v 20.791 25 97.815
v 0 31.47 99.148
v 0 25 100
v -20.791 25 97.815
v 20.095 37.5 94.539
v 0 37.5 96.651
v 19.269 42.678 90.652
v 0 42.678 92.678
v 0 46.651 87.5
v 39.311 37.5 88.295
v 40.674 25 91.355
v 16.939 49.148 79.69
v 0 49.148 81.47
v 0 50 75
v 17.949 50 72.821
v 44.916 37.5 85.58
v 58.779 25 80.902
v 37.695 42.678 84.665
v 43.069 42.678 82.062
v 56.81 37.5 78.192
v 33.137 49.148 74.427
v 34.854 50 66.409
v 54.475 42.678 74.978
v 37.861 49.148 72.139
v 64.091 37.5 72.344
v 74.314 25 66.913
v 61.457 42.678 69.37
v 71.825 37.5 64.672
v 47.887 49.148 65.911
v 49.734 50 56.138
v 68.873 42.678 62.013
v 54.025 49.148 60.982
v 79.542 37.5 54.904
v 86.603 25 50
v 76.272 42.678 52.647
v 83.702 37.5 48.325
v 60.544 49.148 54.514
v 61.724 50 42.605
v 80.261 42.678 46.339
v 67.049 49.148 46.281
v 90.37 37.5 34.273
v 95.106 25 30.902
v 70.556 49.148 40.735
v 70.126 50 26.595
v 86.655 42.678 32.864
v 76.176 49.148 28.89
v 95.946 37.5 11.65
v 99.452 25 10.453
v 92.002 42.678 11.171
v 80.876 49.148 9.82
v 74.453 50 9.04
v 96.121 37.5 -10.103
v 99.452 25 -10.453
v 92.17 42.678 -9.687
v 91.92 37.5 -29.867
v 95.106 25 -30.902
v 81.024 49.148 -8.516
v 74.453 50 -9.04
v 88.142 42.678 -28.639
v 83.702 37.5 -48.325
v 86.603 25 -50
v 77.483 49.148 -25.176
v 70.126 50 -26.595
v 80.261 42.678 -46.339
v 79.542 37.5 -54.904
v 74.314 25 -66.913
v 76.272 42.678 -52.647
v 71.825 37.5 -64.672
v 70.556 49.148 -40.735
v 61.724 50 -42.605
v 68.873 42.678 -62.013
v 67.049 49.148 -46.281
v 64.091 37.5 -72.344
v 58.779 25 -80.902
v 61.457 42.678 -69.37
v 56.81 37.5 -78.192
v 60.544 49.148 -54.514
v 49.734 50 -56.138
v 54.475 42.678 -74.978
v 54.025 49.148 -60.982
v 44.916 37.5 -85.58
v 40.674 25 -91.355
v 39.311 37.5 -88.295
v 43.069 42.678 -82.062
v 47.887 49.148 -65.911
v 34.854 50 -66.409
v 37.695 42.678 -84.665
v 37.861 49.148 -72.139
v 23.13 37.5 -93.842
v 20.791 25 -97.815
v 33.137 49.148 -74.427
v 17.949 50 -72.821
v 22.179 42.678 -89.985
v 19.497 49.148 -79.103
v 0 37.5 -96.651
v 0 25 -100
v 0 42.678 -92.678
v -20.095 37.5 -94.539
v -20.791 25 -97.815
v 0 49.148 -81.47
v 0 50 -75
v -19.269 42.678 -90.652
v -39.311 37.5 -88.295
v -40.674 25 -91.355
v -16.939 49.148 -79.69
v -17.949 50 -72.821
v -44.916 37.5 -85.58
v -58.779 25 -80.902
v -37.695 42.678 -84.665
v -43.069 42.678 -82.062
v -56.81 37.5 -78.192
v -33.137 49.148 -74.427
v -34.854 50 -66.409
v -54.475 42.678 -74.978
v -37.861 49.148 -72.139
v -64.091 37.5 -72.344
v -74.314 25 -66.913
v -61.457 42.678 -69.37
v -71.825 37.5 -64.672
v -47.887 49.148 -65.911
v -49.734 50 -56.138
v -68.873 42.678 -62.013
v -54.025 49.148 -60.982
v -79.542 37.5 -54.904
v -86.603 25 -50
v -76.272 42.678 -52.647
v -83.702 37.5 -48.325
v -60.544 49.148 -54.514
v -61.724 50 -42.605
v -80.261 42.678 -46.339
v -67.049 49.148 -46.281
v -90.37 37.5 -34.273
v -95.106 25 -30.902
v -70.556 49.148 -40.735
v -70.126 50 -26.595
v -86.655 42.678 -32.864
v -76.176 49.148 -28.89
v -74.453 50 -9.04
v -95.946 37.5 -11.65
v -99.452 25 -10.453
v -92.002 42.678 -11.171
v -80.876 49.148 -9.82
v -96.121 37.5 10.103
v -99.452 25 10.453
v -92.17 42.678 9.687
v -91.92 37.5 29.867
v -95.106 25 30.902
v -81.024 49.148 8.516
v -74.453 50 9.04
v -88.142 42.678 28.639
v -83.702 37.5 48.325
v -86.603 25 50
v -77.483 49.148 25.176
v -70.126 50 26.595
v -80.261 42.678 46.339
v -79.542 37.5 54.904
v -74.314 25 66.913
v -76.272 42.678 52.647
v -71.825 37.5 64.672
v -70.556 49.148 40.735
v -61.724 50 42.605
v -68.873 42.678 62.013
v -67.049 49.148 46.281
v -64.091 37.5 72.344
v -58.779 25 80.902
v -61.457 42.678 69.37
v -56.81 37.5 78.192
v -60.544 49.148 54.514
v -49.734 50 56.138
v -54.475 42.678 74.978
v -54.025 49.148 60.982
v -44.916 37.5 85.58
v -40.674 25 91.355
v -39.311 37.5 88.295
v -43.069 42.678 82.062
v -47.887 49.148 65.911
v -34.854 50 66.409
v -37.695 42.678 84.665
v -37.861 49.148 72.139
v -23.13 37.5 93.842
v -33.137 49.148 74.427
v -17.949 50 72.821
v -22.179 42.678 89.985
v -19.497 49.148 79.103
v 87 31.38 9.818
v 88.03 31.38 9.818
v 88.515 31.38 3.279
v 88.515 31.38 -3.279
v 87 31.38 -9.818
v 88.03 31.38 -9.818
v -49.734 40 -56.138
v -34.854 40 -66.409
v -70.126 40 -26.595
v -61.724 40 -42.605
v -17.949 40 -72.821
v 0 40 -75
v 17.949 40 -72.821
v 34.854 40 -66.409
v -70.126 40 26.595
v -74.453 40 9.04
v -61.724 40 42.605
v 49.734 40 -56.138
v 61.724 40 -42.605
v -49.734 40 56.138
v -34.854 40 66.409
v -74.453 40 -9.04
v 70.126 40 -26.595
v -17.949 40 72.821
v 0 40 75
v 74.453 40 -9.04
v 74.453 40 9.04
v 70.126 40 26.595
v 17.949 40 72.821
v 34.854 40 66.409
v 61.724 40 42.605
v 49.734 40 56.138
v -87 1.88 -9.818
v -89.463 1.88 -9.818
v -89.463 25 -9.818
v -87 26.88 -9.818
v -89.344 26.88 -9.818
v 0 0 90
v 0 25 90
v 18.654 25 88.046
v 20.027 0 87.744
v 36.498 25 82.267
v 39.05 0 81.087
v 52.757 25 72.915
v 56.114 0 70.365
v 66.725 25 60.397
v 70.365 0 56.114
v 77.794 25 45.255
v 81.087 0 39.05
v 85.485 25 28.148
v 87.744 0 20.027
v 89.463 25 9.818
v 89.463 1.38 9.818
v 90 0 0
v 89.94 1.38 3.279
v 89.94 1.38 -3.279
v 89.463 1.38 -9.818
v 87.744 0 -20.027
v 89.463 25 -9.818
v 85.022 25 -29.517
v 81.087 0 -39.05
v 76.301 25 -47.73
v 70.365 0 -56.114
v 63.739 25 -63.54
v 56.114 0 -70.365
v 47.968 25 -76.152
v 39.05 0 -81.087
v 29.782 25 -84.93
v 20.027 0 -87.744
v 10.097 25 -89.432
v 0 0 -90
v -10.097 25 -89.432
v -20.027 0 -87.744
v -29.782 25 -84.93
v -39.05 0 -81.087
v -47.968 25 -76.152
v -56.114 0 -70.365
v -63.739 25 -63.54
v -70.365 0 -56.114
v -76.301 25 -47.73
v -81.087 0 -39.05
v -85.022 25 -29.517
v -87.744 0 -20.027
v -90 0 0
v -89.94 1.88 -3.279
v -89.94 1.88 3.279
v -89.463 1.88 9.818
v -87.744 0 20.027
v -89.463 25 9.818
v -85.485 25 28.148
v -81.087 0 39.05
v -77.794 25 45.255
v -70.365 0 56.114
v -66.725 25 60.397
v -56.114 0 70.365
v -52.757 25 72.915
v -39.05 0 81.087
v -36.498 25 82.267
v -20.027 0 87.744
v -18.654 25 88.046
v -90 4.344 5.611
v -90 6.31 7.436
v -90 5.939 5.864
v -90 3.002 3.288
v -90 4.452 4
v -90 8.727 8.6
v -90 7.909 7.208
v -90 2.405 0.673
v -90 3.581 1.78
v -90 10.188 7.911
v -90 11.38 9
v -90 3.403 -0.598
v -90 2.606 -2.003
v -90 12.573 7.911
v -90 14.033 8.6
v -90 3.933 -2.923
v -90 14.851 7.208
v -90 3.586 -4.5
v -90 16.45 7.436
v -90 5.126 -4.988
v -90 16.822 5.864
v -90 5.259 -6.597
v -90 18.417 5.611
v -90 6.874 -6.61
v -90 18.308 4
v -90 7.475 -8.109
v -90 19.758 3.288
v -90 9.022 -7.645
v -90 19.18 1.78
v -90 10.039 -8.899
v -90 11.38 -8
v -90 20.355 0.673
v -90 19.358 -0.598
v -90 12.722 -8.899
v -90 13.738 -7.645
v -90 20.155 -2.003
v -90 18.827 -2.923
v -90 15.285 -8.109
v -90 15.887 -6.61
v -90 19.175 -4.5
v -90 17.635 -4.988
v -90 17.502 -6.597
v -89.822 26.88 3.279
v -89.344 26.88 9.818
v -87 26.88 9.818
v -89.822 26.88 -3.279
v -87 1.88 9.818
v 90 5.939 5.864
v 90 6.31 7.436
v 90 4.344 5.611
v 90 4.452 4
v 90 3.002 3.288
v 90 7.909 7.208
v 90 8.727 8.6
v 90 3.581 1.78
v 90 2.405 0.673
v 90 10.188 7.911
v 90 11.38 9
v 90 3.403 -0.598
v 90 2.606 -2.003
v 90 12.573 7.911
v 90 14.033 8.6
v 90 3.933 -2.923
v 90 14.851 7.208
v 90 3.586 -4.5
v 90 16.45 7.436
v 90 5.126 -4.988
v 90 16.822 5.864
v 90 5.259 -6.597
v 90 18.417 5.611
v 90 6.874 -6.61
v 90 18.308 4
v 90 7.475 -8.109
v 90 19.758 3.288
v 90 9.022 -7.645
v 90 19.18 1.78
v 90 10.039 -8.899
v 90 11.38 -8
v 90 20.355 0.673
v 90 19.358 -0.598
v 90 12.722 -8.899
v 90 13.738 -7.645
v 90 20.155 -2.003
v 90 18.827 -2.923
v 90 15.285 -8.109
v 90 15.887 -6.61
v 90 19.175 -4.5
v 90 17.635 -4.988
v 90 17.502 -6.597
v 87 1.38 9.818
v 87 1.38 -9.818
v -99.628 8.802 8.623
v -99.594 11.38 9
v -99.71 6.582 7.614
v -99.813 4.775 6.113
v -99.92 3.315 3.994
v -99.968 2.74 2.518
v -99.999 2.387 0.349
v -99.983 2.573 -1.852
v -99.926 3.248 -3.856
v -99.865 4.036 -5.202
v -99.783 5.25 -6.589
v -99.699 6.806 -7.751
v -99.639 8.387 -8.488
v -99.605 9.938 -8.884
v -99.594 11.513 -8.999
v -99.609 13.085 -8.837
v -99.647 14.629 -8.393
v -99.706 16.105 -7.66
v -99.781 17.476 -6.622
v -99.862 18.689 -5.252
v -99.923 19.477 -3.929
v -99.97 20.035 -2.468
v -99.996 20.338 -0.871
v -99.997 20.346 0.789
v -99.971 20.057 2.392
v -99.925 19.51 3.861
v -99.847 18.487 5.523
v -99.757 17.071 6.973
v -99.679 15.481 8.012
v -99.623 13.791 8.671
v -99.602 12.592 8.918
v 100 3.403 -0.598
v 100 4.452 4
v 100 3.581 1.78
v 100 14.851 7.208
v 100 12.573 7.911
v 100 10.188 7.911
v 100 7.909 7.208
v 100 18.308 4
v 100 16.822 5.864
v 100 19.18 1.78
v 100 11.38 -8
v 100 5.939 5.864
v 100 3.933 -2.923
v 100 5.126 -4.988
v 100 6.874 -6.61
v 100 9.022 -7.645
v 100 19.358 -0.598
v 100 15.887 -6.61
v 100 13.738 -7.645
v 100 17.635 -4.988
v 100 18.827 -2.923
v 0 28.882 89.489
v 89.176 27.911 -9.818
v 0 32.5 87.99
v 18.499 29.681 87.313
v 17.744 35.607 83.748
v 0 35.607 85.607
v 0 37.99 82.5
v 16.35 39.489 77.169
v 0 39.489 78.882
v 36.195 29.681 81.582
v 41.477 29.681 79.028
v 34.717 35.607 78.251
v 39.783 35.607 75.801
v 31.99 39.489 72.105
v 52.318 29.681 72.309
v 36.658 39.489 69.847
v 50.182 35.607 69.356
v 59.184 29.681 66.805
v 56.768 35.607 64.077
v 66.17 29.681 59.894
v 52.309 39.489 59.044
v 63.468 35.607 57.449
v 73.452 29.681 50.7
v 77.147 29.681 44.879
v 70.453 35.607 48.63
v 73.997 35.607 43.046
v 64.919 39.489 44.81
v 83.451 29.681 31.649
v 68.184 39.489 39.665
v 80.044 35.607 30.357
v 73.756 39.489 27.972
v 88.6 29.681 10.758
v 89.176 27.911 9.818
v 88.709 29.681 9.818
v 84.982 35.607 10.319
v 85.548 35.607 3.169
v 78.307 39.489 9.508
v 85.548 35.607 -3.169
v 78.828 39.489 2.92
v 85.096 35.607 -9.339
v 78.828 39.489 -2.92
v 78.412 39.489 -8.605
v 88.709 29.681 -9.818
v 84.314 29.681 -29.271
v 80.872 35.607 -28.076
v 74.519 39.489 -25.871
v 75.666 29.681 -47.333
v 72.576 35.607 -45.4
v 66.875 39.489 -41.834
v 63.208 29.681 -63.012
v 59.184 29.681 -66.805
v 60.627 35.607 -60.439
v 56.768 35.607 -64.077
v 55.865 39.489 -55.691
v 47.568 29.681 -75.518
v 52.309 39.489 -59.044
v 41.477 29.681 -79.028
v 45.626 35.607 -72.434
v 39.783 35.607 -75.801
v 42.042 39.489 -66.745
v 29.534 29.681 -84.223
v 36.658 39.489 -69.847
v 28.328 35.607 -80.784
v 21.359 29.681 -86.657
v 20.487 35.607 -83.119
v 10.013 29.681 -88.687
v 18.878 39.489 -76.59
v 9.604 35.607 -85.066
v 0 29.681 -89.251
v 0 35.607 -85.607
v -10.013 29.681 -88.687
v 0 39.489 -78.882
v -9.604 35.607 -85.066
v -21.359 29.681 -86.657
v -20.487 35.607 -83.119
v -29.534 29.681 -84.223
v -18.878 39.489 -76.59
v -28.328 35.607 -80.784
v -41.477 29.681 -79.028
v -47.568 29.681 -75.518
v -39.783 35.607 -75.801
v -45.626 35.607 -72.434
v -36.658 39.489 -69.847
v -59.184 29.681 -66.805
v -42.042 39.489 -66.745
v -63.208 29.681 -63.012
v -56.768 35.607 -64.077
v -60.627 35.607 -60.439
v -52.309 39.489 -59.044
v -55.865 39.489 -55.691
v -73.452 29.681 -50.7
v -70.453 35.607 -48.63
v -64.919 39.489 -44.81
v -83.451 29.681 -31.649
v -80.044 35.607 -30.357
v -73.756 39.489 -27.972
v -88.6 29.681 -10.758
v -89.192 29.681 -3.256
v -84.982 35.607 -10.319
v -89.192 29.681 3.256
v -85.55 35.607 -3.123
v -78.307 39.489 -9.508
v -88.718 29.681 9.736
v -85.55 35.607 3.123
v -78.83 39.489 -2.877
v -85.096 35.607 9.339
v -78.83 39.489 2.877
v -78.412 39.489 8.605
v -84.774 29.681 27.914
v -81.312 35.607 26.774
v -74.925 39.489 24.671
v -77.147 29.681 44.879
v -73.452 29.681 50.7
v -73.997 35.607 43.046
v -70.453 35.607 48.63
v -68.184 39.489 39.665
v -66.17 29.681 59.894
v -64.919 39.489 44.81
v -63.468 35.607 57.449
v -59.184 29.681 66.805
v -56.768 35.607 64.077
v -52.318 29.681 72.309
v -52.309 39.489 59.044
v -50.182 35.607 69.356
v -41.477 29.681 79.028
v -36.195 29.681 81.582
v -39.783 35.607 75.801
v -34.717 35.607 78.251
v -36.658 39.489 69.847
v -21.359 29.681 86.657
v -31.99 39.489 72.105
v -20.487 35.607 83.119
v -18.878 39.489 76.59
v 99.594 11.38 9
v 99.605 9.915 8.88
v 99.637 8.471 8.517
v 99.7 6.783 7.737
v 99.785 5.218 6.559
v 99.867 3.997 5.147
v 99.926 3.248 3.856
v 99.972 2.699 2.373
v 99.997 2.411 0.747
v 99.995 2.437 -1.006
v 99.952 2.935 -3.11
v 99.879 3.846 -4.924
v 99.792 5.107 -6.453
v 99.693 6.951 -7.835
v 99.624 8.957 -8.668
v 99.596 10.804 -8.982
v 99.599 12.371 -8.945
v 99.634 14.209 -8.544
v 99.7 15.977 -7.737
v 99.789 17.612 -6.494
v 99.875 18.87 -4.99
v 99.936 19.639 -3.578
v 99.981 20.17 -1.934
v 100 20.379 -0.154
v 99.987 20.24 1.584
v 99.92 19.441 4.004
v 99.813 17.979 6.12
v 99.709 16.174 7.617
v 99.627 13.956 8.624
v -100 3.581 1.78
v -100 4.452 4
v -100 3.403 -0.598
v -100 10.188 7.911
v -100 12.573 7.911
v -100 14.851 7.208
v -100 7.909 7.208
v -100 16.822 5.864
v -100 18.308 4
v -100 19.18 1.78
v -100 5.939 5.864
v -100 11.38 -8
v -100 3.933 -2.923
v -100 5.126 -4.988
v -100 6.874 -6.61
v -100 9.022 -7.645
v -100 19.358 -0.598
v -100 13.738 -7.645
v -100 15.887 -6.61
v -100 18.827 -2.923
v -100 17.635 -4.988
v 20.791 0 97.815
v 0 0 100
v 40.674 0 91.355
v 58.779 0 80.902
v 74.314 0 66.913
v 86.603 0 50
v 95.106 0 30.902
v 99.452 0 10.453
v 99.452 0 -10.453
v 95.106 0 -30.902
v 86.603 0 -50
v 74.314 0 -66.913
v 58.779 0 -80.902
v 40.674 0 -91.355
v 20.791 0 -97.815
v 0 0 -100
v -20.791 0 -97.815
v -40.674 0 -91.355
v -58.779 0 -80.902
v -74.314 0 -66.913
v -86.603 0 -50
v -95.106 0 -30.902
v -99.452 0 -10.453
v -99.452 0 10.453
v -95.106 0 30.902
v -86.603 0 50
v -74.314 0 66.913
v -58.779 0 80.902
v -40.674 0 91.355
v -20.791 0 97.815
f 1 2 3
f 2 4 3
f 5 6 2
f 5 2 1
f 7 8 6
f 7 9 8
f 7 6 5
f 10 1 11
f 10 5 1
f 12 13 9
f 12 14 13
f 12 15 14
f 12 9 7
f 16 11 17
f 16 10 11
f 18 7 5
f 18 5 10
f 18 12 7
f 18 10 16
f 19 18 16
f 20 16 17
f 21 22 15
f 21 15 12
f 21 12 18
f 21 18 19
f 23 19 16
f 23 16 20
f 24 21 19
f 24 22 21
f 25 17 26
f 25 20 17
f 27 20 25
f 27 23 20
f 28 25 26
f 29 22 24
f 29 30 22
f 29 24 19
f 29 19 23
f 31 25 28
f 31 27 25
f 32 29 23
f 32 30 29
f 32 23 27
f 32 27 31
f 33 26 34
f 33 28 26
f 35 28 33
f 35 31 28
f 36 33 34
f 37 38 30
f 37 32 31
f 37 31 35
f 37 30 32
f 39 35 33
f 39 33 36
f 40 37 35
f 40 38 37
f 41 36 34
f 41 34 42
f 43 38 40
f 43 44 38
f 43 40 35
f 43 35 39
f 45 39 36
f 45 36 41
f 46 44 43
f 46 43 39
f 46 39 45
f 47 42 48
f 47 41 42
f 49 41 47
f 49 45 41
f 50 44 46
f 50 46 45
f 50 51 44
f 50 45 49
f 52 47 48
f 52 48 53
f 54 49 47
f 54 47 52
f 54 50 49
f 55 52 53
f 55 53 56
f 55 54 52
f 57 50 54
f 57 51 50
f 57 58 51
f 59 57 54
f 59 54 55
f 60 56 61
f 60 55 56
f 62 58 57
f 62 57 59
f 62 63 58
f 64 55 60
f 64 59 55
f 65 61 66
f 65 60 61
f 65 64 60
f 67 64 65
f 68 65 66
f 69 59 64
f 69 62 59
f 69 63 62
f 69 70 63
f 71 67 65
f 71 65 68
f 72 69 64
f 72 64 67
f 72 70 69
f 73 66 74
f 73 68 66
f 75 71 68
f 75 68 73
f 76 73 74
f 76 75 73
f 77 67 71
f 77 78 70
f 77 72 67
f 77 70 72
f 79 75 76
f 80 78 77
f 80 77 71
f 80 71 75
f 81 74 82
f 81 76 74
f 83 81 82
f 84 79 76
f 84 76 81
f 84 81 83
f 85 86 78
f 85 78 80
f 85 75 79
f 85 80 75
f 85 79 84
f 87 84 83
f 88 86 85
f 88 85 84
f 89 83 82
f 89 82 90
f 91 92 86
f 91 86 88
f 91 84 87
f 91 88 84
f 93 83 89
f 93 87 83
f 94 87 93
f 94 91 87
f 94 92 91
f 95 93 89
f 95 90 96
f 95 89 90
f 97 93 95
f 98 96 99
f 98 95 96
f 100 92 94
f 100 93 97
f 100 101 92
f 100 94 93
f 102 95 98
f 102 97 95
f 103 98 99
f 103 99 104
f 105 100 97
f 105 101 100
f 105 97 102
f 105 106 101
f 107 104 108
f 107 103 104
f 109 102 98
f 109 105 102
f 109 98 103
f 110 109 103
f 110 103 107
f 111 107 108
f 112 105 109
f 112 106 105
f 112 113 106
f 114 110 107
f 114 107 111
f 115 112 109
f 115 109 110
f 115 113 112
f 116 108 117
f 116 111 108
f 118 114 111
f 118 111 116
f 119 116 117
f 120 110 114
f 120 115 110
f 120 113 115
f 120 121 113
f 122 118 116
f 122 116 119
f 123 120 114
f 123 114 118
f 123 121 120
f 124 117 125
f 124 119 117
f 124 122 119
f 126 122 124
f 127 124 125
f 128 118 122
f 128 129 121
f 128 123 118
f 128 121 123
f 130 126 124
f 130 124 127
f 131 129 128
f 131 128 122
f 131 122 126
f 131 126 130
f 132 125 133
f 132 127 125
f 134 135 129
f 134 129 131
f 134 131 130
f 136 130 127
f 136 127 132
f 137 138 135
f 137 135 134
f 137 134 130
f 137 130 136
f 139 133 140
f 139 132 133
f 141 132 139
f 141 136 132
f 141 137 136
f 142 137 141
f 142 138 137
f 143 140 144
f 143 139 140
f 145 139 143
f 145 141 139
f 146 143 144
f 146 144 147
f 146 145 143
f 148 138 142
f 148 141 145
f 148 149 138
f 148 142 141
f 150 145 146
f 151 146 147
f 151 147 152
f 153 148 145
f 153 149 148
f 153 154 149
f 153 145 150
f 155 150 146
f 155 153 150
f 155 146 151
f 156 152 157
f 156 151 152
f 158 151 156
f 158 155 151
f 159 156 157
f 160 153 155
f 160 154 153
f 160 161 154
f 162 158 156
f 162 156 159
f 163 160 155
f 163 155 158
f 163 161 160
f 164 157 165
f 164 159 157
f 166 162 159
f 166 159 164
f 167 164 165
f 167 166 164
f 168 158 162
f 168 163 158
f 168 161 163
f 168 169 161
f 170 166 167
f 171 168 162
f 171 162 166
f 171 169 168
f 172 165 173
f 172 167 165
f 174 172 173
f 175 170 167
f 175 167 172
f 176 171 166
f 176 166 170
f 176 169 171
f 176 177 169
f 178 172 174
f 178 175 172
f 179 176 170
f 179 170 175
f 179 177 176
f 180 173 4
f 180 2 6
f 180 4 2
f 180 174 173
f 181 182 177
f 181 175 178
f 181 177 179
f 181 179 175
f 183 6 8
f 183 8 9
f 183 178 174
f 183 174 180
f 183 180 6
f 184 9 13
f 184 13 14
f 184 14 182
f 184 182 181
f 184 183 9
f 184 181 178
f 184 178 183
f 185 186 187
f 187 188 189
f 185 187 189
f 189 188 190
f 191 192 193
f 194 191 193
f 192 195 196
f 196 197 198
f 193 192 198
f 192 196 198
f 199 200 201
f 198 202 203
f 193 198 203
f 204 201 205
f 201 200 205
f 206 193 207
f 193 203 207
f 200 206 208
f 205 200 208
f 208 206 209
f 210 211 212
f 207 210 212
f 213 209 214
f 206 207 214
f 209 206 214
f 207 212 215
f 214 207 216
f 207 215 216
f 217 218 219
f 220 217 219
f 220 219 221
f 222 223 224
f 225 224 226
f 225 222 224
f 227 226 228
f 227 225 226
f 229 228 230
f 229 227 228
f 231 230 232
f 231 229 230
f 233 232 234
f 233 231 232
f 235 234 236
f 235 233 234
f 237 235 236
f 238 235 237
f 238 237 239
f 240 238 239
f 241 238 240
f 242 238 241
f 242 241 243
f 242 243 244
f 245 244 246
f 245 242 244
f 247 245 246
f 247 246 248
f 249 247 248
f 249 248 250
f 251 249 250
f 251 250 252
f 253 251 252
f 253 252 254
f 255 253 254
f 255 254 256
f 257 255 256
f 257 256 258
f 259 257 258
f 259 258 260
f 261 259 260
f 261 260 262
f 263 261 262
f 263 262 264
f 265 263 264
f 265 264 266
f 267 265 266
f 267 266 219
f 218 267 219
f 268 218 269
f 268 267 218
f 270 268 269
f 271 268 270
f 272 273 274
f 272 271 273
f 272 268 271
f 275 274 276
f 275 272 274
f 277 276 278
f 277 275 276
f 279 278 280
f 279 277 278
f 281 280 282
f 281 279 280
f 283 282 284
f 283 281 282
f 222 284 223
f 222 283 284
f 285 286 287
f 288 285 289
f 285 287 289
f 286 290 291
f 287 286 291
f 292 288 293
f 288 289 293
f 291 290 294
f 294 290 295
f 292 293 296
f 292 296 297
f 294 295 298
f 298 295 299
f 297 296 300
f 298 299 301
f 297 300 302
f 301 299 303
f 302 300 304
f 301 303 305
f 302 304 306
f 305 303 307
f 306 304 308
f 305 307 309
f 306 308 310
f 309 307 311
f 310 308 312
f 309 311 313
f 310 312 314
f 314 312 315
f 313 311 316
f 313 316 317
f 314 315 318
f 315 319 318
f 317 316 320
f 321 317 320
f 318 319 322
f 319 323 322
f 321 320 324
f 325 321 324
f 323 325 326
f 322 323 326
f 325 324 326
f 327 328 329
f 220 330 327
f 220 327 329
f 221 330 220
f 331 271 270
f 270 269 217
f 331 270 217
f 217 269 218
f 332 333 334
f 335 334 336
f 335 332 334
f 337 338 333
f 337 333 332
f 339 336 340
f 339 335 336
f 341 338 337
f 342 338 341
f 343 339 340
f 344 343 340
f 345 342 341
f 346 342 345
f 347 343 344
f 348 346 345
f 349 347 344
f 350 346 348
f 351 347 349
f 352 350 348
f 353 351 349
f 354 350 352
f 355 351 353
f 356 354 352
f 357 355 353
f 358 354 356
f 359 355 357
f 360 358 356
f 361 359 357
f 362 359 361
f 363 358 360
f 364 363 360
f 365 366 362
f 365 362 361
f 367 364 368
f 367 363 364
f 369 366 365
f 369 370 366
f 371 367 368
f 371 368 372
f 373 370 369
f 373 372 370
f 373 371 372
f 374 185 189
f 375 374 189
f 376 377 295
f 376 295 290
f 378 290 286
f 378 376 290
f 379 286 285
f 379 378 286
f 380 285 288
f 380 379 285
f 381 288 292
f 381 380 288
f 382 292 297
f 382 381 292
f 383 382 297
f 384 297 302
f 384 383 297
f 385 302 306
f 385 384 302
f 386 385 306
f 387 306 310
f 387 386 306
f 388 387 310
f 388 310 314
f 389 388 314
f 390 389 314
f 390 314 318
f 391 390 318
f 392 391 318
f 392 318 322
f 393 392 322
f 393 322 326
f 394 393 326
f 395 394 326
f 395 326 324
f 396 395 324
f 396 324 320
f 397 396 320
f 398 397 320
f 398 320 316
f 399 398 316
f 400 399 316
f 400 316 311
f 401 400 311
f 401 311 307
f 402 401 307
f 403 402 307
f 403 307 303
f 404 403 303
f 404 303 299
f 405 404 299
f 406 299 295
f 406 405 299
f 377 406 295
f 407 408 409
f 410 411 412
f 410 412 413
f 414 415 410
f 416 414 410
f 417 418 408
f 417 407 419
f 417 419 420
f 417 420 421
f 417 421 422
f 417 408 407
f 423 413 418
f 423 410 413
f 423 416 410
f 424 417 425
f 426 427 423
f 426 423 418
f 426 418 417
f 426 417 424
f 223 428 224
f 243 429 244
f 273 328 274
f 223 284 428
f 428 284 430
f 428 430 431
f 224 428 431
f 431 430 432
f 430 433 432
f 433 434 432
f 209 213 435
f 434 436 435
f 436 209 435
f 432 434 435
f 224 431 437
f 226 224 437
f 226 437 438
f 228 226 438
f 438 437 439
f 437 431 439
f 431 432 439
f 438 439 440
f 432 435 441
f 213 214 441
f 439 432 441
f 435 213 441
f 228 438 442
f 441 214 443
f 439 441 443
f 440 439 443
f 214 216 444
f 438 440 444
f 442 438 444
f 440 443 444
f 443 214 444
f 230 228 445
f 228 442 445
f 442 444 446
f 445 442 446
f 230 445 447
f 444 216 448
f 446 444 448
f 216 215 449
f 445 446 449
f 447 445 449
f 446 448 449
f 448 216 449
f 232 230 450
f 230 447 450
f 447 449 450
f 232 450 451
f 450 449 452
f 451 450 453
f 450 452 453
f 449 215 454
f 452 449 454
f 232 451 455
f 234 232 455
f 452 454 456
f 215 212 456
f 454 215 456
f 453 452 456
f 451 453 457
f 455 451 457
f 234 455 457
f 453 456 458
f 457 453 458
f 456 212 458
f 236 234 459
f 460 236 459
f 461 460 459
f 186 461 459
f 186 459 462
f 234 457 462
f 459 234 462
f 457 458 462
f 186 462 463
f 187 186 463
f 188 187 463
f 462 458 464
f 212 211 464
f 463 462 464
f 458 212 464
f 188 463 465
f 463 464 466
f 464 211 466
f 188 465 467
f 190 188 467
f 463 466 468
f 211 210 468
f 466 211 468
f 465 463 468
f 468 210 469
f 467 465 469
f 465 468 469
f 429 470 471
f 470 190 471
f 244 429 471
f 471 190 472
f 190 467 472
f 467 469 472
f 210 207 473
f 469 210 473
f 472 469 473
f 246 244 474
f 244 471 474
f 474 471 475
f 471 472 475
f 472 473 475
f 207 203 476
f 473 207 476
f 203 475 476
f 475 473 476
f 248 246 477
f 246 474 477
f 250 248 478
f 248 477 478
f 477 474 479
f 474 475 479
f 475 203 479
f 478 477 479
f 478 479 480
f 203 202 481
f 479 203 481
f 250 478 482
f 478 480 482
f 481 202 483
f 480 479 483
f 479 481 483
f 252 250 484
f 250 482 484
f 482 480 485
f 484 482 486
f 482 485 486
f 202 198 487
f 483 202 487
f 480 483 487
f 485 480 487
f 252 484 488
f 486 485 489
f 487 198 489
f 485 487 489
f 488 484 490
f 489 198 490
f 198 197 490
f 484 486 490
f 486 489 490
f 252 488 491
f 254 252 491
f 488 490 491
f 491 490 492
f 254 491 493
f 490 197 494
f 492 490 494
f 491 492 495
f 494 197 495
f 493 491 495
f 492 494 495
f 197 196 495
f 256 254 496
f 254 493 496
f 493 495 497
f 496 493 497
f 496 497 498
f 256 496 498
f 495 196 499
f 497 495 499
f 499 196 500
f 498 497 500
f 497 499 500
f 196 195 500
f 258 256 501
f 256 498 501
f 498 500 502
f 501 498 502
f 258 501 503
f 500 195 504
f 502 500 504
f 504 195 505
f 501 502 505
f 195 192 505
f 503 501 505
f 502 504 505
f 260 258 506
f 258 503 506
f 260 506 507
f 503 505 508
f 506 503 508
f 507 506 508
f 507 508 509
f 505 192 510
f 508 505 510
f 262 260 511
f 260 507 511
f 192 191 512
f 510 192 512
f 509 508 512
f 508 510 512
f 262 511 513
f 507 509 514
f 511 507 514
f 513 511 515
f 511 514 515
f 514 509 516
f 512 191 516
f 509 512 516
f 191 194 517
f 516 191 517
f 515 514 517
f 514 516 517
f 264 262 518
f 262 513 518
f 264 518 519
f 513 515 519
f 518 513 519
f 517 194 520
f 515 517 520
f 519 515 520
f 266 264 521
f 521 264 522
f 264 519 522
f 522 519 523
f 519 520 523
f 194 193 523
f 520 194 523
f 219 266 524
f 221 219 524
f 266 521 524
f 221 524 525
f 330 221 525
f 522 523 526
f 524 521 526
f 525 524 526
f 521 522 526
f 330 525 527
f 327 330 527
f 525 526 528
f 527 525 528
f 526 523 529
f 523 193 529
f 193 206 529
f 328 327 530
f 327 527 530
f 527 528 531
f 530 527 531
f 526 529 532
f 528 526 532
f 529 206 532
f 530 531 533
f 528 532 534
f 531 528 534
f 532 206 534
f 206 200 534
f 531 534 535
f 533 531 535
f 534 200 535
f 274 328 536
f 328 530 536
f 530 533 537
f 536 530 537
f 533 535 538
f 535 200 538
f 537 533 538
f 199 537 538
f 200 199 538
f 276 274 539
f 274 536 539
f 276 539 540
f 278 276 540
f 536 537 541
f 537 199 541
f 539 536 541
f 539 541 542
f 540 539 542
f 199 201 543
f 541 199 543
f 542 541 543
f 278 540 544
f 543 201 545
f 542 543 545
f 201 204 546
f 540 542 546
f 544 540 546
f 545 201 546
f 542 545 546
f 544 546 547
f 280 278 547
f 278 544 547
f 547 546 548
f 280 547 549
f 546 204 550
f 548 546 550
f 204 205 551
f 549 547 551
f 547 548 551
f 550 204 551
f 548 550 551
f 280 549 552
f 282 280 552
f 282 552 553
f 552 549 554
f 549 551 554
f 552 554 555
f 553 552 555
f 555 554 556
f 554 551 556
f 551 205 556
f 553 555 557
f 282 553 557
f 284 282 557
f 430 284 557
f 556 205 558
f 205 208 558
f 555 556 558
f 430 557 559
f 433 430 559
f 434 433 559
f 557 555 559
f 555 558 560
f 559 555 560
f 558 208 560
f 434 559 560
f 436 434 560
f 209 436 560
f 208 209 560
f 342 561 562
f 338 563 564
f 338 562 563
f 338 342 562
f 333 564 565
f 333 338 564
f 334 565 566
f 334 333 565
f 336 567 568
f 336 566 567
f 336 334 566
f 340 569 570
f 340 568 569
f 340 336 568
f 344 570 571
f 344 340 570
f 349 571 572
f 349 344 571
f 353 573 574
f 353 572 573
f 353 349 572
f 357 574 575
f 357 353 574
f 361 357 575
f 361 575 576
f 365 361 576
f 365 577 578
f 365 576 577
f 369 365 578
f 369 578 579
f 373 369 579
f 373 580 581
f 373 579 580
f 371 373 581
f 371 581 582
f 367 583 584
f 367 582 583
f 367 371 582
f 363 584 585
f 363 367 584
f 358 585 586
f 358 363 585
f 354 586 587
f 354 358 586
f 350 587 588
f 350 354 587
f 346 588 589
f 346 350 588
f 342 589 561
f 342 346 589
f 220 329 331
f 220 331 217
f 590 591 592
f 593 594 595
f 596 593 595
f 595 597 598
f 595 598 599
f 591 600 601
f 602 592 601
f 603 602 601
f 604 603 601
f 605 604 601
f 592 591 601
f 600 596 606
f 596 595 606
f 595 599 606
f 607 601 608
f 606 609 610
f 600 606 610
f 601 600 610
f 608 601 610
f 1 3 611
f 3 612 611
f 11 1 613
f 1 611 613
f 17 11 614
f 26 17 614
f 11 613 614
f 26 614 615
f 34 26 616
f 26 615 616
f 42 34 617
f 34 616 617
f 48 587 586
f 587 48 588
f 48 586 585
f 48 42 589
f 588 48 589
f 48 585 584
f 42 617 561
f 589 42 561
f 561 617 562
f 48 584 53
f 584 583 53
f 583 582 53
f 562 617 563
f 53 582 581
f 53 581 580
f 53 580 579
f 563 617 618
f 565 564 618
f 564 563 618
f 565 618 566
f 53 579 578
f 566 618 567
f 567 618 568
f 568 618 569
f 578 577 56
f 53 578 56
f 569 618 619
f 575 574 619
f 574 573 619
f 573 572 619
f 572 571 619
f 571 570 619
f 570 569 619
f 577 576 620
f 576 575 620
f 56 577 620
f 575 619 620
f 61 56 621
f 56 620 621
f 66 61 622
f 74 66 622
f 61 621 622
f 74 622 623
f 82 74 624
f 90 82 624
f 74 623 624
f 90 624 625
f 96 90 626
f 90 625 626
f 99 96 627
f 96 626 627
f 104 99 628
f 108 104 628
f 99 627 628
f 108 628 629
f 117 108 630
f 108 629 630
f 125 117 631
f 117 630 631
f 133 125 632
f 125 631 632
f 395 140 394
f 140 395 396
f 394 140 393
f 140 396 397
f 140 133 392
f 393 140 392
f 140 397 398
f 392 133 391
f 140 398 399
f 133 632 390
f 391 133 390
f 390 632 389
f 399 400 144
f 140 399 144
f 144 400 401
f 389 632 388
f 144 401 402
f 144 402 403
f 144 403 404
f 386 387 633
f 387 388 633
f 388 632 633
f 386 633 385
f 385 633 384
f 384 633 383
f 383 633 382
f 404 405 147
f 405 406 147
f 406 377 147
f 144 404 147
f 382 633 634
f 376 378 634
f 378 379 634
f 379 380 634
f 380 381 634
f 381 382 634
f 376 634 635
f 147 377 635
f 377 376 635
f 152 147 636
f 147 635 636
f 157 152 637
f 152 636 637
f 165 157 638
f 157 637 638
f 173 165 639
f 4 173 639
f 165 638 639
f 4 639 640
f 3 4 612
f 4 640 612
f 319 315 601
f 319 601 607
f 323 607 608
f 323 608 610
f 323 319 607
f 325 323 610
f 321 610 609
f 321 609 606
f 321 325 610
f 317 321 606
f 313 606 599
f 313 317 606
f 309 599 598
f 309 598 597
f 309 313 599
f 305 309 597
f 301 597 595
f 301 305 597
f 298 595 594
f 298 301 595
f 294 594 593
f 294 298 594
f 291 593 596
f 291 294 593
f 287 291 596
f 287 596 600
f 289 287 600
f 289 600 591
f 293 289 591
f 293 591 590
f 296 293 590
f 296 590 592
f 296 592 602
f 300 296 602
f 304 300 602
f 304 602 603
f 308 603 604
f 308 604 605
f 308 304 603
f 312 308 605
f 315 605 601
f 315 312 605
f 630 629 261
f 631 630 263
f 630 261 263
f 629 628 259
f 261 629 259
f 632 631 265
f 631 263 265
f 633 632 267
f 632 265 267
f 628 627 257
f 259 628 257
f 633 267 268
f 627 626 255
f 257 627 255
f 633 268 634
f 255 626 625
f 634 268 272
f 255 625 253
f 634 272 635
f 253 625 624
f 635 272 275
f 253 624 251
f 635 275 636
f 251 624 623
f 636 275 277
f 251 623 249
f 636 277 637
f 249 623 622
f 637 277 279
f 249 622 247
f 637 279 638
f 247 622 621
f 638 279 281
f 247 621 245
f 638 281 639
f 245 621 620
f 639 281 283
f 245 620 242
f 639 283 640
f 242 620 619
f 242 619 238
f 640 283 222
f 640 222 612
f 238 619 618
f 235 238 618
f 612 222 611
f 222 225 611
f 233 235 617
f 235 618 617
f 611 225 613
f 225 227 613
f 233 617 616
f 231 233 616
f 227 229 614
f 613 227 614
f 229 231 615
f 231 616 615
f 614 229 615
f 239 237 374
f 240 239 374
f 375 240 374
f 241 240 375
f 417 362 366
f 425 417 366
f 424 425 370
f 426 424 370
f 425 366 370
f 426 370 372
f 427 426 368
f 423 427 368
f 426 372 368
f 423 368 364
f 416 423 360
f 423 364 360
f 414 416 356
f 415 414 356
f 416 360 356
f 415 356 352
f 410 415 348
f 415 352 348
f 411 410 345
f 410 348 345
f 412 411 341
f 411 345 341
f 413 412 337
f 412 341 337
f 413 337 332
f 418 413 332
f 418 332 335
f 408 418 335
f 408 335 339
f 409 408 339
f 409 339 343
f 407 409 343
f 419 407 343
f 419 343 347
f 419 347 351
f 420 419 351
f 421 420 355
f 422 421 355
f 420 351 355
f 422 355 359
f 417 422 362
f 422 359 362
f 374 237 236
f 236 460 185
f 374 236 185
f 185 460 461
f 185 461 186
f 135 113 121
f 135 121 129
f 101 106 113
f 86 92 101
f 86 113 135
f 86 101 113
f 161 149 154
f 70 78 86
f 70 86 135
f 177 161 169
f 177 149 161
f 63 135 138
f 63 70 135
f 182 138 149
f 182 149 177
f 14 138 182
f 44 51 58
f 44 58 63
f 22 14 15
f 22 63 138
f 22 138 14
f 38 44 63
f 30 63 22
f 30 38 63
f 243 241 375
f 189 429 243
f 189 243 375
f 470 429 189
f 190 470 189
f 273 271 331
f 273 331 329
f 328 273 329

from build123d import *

# Parameters (mm, degrees)
SKETCH_1_R               = 100
EXTRUDE_1_DEPTH          = 50
FILLET_1_R               = 25
SHELL_1_T                = -10
CUT_EXTRUDE_1_DEPTH      = 100
CUT_EXTRUDE_1_DEPTH_BACK = 100
SKETCH_7_R               = 9
SKETCH_8_R               = 8
EXTRUDE_2_DEPTH          = 10
SKETCH_9_W               = 19.636204252
SKETCH_9_H               = 30
EXTRUDE_3_DEPTH          = 3
SKETCH_10_R              = 8
EXTRUDE_4_DEPTH          = 10
SKETCH_11_W              = 19.636204252
SKETCH_11_H              = 25
EXTRUDE_5_DEPTH          = 3


with BuildPart() as part:
    # 草图1 → 凸台-拉伸1 (new body)
    with BuildSketch(Plane(origin=(0, 0, 0), x_dir=(1, 0, 0), z_dir=(0, 1, 0))):
        Circle(SKETCH_1_R)
    extrude(amount=EXTRUDE_1_DEPTH)

    # 圆角1
    fillet_1_edges = [part.edges().sort_by_distance(p)[0] for p in [
        (-100, 50, 0),
    ]]
    fillet(fillet_1_edges, radius=FILLET_1_R)

    # 抽壳1
    shell_1_openings = [part.faces().sort_by_distance(p)[0] for p in [
        (0, 0, 0),
    ]]
    offset(amount=SHELL_1_T, openings=shell_1_openings, kind=Kind.INTERSECTION)

    # 草图7 → 切除-拉伸1 (cut, two sides: drawn at the far end of the back side and taken through both)
    with BuildSketch(Plane(origin=(0, 0, 0), x_dir=(0, 0, -1), z_dir=(1, 0, 0)).offset(-CUT_EXTRUDE_1_DEPTH_BACK)):
        with Locations((0, 11.380292073)):
            Circle(SKETCH_7_R)
    extrude(amount=CUT_EXTRUDE_1_DEPTH + CUT_EXTRUDE_1_DEPTH_BACK, mode=Mode.SUBTRACT)



with BuildPart() as body_2:
    # 草图8 → 凸台-拉伸2 (new body)
    with BuildSketch(Plane(origin=(90, 0, 0), x_dir=(0, 0, -1), z_dir=(1, 0, 0))):
        with Locations((0, 11.380292073)):
            Circle(SKETCH_8_R)
    extrude(amount=EXTRUDE_2_DEPTH)


with BuildPart() as part_1:
    add(part.part)

    add(body_2.part)  # 凸台-拉伸3 merges body 2
    # 草图9 → 凸台-拉伸3 (add)
    with BuildSketch(Plane(origin=(90, 0, 0), x_dir=(0, 0, -1), z_dir=(1, 0, 0))):
        with Locations((0, 16.380292073)):
            Rectangle(SKETCH_9_W, SKETCH_9_H)
    extrude(amount=-EXTRUDE_3_DEPTH)



with BuildPart() as body_2_2:
    # 草图10 → 凸台-拉伸4 (new body)
    with BuildSketch(Plane(origin=(-90, 0, 0), x_dir=(0, 0, -1), z_dir=(1, 0, 0))):
        with Locations((0, 11.380292073)):
            Circle(SKETCH_10_R)
    extrude(amount=-EXTRUDE_4_DEPTH)


with BuildPart() as part_2:
    add(part_1.part)

    add(body_2_2.part)  # 凸台-拉伸5 merges body 2 2
    # 草图11 → 凸台-拉伸5 (add)
    with BuildSketch(Plane(origin=(-90, 0, 0), x_dir=(0, 0, -1), z_dir=(1, 0, 0))):
        with Locations((0, 14.380292073)):
            Rectangle(SKETCH_11_W, SKETCH_11_H)
    extrude(amount=EXTRUDE_5_DEPTH)


solid = part_2.part
